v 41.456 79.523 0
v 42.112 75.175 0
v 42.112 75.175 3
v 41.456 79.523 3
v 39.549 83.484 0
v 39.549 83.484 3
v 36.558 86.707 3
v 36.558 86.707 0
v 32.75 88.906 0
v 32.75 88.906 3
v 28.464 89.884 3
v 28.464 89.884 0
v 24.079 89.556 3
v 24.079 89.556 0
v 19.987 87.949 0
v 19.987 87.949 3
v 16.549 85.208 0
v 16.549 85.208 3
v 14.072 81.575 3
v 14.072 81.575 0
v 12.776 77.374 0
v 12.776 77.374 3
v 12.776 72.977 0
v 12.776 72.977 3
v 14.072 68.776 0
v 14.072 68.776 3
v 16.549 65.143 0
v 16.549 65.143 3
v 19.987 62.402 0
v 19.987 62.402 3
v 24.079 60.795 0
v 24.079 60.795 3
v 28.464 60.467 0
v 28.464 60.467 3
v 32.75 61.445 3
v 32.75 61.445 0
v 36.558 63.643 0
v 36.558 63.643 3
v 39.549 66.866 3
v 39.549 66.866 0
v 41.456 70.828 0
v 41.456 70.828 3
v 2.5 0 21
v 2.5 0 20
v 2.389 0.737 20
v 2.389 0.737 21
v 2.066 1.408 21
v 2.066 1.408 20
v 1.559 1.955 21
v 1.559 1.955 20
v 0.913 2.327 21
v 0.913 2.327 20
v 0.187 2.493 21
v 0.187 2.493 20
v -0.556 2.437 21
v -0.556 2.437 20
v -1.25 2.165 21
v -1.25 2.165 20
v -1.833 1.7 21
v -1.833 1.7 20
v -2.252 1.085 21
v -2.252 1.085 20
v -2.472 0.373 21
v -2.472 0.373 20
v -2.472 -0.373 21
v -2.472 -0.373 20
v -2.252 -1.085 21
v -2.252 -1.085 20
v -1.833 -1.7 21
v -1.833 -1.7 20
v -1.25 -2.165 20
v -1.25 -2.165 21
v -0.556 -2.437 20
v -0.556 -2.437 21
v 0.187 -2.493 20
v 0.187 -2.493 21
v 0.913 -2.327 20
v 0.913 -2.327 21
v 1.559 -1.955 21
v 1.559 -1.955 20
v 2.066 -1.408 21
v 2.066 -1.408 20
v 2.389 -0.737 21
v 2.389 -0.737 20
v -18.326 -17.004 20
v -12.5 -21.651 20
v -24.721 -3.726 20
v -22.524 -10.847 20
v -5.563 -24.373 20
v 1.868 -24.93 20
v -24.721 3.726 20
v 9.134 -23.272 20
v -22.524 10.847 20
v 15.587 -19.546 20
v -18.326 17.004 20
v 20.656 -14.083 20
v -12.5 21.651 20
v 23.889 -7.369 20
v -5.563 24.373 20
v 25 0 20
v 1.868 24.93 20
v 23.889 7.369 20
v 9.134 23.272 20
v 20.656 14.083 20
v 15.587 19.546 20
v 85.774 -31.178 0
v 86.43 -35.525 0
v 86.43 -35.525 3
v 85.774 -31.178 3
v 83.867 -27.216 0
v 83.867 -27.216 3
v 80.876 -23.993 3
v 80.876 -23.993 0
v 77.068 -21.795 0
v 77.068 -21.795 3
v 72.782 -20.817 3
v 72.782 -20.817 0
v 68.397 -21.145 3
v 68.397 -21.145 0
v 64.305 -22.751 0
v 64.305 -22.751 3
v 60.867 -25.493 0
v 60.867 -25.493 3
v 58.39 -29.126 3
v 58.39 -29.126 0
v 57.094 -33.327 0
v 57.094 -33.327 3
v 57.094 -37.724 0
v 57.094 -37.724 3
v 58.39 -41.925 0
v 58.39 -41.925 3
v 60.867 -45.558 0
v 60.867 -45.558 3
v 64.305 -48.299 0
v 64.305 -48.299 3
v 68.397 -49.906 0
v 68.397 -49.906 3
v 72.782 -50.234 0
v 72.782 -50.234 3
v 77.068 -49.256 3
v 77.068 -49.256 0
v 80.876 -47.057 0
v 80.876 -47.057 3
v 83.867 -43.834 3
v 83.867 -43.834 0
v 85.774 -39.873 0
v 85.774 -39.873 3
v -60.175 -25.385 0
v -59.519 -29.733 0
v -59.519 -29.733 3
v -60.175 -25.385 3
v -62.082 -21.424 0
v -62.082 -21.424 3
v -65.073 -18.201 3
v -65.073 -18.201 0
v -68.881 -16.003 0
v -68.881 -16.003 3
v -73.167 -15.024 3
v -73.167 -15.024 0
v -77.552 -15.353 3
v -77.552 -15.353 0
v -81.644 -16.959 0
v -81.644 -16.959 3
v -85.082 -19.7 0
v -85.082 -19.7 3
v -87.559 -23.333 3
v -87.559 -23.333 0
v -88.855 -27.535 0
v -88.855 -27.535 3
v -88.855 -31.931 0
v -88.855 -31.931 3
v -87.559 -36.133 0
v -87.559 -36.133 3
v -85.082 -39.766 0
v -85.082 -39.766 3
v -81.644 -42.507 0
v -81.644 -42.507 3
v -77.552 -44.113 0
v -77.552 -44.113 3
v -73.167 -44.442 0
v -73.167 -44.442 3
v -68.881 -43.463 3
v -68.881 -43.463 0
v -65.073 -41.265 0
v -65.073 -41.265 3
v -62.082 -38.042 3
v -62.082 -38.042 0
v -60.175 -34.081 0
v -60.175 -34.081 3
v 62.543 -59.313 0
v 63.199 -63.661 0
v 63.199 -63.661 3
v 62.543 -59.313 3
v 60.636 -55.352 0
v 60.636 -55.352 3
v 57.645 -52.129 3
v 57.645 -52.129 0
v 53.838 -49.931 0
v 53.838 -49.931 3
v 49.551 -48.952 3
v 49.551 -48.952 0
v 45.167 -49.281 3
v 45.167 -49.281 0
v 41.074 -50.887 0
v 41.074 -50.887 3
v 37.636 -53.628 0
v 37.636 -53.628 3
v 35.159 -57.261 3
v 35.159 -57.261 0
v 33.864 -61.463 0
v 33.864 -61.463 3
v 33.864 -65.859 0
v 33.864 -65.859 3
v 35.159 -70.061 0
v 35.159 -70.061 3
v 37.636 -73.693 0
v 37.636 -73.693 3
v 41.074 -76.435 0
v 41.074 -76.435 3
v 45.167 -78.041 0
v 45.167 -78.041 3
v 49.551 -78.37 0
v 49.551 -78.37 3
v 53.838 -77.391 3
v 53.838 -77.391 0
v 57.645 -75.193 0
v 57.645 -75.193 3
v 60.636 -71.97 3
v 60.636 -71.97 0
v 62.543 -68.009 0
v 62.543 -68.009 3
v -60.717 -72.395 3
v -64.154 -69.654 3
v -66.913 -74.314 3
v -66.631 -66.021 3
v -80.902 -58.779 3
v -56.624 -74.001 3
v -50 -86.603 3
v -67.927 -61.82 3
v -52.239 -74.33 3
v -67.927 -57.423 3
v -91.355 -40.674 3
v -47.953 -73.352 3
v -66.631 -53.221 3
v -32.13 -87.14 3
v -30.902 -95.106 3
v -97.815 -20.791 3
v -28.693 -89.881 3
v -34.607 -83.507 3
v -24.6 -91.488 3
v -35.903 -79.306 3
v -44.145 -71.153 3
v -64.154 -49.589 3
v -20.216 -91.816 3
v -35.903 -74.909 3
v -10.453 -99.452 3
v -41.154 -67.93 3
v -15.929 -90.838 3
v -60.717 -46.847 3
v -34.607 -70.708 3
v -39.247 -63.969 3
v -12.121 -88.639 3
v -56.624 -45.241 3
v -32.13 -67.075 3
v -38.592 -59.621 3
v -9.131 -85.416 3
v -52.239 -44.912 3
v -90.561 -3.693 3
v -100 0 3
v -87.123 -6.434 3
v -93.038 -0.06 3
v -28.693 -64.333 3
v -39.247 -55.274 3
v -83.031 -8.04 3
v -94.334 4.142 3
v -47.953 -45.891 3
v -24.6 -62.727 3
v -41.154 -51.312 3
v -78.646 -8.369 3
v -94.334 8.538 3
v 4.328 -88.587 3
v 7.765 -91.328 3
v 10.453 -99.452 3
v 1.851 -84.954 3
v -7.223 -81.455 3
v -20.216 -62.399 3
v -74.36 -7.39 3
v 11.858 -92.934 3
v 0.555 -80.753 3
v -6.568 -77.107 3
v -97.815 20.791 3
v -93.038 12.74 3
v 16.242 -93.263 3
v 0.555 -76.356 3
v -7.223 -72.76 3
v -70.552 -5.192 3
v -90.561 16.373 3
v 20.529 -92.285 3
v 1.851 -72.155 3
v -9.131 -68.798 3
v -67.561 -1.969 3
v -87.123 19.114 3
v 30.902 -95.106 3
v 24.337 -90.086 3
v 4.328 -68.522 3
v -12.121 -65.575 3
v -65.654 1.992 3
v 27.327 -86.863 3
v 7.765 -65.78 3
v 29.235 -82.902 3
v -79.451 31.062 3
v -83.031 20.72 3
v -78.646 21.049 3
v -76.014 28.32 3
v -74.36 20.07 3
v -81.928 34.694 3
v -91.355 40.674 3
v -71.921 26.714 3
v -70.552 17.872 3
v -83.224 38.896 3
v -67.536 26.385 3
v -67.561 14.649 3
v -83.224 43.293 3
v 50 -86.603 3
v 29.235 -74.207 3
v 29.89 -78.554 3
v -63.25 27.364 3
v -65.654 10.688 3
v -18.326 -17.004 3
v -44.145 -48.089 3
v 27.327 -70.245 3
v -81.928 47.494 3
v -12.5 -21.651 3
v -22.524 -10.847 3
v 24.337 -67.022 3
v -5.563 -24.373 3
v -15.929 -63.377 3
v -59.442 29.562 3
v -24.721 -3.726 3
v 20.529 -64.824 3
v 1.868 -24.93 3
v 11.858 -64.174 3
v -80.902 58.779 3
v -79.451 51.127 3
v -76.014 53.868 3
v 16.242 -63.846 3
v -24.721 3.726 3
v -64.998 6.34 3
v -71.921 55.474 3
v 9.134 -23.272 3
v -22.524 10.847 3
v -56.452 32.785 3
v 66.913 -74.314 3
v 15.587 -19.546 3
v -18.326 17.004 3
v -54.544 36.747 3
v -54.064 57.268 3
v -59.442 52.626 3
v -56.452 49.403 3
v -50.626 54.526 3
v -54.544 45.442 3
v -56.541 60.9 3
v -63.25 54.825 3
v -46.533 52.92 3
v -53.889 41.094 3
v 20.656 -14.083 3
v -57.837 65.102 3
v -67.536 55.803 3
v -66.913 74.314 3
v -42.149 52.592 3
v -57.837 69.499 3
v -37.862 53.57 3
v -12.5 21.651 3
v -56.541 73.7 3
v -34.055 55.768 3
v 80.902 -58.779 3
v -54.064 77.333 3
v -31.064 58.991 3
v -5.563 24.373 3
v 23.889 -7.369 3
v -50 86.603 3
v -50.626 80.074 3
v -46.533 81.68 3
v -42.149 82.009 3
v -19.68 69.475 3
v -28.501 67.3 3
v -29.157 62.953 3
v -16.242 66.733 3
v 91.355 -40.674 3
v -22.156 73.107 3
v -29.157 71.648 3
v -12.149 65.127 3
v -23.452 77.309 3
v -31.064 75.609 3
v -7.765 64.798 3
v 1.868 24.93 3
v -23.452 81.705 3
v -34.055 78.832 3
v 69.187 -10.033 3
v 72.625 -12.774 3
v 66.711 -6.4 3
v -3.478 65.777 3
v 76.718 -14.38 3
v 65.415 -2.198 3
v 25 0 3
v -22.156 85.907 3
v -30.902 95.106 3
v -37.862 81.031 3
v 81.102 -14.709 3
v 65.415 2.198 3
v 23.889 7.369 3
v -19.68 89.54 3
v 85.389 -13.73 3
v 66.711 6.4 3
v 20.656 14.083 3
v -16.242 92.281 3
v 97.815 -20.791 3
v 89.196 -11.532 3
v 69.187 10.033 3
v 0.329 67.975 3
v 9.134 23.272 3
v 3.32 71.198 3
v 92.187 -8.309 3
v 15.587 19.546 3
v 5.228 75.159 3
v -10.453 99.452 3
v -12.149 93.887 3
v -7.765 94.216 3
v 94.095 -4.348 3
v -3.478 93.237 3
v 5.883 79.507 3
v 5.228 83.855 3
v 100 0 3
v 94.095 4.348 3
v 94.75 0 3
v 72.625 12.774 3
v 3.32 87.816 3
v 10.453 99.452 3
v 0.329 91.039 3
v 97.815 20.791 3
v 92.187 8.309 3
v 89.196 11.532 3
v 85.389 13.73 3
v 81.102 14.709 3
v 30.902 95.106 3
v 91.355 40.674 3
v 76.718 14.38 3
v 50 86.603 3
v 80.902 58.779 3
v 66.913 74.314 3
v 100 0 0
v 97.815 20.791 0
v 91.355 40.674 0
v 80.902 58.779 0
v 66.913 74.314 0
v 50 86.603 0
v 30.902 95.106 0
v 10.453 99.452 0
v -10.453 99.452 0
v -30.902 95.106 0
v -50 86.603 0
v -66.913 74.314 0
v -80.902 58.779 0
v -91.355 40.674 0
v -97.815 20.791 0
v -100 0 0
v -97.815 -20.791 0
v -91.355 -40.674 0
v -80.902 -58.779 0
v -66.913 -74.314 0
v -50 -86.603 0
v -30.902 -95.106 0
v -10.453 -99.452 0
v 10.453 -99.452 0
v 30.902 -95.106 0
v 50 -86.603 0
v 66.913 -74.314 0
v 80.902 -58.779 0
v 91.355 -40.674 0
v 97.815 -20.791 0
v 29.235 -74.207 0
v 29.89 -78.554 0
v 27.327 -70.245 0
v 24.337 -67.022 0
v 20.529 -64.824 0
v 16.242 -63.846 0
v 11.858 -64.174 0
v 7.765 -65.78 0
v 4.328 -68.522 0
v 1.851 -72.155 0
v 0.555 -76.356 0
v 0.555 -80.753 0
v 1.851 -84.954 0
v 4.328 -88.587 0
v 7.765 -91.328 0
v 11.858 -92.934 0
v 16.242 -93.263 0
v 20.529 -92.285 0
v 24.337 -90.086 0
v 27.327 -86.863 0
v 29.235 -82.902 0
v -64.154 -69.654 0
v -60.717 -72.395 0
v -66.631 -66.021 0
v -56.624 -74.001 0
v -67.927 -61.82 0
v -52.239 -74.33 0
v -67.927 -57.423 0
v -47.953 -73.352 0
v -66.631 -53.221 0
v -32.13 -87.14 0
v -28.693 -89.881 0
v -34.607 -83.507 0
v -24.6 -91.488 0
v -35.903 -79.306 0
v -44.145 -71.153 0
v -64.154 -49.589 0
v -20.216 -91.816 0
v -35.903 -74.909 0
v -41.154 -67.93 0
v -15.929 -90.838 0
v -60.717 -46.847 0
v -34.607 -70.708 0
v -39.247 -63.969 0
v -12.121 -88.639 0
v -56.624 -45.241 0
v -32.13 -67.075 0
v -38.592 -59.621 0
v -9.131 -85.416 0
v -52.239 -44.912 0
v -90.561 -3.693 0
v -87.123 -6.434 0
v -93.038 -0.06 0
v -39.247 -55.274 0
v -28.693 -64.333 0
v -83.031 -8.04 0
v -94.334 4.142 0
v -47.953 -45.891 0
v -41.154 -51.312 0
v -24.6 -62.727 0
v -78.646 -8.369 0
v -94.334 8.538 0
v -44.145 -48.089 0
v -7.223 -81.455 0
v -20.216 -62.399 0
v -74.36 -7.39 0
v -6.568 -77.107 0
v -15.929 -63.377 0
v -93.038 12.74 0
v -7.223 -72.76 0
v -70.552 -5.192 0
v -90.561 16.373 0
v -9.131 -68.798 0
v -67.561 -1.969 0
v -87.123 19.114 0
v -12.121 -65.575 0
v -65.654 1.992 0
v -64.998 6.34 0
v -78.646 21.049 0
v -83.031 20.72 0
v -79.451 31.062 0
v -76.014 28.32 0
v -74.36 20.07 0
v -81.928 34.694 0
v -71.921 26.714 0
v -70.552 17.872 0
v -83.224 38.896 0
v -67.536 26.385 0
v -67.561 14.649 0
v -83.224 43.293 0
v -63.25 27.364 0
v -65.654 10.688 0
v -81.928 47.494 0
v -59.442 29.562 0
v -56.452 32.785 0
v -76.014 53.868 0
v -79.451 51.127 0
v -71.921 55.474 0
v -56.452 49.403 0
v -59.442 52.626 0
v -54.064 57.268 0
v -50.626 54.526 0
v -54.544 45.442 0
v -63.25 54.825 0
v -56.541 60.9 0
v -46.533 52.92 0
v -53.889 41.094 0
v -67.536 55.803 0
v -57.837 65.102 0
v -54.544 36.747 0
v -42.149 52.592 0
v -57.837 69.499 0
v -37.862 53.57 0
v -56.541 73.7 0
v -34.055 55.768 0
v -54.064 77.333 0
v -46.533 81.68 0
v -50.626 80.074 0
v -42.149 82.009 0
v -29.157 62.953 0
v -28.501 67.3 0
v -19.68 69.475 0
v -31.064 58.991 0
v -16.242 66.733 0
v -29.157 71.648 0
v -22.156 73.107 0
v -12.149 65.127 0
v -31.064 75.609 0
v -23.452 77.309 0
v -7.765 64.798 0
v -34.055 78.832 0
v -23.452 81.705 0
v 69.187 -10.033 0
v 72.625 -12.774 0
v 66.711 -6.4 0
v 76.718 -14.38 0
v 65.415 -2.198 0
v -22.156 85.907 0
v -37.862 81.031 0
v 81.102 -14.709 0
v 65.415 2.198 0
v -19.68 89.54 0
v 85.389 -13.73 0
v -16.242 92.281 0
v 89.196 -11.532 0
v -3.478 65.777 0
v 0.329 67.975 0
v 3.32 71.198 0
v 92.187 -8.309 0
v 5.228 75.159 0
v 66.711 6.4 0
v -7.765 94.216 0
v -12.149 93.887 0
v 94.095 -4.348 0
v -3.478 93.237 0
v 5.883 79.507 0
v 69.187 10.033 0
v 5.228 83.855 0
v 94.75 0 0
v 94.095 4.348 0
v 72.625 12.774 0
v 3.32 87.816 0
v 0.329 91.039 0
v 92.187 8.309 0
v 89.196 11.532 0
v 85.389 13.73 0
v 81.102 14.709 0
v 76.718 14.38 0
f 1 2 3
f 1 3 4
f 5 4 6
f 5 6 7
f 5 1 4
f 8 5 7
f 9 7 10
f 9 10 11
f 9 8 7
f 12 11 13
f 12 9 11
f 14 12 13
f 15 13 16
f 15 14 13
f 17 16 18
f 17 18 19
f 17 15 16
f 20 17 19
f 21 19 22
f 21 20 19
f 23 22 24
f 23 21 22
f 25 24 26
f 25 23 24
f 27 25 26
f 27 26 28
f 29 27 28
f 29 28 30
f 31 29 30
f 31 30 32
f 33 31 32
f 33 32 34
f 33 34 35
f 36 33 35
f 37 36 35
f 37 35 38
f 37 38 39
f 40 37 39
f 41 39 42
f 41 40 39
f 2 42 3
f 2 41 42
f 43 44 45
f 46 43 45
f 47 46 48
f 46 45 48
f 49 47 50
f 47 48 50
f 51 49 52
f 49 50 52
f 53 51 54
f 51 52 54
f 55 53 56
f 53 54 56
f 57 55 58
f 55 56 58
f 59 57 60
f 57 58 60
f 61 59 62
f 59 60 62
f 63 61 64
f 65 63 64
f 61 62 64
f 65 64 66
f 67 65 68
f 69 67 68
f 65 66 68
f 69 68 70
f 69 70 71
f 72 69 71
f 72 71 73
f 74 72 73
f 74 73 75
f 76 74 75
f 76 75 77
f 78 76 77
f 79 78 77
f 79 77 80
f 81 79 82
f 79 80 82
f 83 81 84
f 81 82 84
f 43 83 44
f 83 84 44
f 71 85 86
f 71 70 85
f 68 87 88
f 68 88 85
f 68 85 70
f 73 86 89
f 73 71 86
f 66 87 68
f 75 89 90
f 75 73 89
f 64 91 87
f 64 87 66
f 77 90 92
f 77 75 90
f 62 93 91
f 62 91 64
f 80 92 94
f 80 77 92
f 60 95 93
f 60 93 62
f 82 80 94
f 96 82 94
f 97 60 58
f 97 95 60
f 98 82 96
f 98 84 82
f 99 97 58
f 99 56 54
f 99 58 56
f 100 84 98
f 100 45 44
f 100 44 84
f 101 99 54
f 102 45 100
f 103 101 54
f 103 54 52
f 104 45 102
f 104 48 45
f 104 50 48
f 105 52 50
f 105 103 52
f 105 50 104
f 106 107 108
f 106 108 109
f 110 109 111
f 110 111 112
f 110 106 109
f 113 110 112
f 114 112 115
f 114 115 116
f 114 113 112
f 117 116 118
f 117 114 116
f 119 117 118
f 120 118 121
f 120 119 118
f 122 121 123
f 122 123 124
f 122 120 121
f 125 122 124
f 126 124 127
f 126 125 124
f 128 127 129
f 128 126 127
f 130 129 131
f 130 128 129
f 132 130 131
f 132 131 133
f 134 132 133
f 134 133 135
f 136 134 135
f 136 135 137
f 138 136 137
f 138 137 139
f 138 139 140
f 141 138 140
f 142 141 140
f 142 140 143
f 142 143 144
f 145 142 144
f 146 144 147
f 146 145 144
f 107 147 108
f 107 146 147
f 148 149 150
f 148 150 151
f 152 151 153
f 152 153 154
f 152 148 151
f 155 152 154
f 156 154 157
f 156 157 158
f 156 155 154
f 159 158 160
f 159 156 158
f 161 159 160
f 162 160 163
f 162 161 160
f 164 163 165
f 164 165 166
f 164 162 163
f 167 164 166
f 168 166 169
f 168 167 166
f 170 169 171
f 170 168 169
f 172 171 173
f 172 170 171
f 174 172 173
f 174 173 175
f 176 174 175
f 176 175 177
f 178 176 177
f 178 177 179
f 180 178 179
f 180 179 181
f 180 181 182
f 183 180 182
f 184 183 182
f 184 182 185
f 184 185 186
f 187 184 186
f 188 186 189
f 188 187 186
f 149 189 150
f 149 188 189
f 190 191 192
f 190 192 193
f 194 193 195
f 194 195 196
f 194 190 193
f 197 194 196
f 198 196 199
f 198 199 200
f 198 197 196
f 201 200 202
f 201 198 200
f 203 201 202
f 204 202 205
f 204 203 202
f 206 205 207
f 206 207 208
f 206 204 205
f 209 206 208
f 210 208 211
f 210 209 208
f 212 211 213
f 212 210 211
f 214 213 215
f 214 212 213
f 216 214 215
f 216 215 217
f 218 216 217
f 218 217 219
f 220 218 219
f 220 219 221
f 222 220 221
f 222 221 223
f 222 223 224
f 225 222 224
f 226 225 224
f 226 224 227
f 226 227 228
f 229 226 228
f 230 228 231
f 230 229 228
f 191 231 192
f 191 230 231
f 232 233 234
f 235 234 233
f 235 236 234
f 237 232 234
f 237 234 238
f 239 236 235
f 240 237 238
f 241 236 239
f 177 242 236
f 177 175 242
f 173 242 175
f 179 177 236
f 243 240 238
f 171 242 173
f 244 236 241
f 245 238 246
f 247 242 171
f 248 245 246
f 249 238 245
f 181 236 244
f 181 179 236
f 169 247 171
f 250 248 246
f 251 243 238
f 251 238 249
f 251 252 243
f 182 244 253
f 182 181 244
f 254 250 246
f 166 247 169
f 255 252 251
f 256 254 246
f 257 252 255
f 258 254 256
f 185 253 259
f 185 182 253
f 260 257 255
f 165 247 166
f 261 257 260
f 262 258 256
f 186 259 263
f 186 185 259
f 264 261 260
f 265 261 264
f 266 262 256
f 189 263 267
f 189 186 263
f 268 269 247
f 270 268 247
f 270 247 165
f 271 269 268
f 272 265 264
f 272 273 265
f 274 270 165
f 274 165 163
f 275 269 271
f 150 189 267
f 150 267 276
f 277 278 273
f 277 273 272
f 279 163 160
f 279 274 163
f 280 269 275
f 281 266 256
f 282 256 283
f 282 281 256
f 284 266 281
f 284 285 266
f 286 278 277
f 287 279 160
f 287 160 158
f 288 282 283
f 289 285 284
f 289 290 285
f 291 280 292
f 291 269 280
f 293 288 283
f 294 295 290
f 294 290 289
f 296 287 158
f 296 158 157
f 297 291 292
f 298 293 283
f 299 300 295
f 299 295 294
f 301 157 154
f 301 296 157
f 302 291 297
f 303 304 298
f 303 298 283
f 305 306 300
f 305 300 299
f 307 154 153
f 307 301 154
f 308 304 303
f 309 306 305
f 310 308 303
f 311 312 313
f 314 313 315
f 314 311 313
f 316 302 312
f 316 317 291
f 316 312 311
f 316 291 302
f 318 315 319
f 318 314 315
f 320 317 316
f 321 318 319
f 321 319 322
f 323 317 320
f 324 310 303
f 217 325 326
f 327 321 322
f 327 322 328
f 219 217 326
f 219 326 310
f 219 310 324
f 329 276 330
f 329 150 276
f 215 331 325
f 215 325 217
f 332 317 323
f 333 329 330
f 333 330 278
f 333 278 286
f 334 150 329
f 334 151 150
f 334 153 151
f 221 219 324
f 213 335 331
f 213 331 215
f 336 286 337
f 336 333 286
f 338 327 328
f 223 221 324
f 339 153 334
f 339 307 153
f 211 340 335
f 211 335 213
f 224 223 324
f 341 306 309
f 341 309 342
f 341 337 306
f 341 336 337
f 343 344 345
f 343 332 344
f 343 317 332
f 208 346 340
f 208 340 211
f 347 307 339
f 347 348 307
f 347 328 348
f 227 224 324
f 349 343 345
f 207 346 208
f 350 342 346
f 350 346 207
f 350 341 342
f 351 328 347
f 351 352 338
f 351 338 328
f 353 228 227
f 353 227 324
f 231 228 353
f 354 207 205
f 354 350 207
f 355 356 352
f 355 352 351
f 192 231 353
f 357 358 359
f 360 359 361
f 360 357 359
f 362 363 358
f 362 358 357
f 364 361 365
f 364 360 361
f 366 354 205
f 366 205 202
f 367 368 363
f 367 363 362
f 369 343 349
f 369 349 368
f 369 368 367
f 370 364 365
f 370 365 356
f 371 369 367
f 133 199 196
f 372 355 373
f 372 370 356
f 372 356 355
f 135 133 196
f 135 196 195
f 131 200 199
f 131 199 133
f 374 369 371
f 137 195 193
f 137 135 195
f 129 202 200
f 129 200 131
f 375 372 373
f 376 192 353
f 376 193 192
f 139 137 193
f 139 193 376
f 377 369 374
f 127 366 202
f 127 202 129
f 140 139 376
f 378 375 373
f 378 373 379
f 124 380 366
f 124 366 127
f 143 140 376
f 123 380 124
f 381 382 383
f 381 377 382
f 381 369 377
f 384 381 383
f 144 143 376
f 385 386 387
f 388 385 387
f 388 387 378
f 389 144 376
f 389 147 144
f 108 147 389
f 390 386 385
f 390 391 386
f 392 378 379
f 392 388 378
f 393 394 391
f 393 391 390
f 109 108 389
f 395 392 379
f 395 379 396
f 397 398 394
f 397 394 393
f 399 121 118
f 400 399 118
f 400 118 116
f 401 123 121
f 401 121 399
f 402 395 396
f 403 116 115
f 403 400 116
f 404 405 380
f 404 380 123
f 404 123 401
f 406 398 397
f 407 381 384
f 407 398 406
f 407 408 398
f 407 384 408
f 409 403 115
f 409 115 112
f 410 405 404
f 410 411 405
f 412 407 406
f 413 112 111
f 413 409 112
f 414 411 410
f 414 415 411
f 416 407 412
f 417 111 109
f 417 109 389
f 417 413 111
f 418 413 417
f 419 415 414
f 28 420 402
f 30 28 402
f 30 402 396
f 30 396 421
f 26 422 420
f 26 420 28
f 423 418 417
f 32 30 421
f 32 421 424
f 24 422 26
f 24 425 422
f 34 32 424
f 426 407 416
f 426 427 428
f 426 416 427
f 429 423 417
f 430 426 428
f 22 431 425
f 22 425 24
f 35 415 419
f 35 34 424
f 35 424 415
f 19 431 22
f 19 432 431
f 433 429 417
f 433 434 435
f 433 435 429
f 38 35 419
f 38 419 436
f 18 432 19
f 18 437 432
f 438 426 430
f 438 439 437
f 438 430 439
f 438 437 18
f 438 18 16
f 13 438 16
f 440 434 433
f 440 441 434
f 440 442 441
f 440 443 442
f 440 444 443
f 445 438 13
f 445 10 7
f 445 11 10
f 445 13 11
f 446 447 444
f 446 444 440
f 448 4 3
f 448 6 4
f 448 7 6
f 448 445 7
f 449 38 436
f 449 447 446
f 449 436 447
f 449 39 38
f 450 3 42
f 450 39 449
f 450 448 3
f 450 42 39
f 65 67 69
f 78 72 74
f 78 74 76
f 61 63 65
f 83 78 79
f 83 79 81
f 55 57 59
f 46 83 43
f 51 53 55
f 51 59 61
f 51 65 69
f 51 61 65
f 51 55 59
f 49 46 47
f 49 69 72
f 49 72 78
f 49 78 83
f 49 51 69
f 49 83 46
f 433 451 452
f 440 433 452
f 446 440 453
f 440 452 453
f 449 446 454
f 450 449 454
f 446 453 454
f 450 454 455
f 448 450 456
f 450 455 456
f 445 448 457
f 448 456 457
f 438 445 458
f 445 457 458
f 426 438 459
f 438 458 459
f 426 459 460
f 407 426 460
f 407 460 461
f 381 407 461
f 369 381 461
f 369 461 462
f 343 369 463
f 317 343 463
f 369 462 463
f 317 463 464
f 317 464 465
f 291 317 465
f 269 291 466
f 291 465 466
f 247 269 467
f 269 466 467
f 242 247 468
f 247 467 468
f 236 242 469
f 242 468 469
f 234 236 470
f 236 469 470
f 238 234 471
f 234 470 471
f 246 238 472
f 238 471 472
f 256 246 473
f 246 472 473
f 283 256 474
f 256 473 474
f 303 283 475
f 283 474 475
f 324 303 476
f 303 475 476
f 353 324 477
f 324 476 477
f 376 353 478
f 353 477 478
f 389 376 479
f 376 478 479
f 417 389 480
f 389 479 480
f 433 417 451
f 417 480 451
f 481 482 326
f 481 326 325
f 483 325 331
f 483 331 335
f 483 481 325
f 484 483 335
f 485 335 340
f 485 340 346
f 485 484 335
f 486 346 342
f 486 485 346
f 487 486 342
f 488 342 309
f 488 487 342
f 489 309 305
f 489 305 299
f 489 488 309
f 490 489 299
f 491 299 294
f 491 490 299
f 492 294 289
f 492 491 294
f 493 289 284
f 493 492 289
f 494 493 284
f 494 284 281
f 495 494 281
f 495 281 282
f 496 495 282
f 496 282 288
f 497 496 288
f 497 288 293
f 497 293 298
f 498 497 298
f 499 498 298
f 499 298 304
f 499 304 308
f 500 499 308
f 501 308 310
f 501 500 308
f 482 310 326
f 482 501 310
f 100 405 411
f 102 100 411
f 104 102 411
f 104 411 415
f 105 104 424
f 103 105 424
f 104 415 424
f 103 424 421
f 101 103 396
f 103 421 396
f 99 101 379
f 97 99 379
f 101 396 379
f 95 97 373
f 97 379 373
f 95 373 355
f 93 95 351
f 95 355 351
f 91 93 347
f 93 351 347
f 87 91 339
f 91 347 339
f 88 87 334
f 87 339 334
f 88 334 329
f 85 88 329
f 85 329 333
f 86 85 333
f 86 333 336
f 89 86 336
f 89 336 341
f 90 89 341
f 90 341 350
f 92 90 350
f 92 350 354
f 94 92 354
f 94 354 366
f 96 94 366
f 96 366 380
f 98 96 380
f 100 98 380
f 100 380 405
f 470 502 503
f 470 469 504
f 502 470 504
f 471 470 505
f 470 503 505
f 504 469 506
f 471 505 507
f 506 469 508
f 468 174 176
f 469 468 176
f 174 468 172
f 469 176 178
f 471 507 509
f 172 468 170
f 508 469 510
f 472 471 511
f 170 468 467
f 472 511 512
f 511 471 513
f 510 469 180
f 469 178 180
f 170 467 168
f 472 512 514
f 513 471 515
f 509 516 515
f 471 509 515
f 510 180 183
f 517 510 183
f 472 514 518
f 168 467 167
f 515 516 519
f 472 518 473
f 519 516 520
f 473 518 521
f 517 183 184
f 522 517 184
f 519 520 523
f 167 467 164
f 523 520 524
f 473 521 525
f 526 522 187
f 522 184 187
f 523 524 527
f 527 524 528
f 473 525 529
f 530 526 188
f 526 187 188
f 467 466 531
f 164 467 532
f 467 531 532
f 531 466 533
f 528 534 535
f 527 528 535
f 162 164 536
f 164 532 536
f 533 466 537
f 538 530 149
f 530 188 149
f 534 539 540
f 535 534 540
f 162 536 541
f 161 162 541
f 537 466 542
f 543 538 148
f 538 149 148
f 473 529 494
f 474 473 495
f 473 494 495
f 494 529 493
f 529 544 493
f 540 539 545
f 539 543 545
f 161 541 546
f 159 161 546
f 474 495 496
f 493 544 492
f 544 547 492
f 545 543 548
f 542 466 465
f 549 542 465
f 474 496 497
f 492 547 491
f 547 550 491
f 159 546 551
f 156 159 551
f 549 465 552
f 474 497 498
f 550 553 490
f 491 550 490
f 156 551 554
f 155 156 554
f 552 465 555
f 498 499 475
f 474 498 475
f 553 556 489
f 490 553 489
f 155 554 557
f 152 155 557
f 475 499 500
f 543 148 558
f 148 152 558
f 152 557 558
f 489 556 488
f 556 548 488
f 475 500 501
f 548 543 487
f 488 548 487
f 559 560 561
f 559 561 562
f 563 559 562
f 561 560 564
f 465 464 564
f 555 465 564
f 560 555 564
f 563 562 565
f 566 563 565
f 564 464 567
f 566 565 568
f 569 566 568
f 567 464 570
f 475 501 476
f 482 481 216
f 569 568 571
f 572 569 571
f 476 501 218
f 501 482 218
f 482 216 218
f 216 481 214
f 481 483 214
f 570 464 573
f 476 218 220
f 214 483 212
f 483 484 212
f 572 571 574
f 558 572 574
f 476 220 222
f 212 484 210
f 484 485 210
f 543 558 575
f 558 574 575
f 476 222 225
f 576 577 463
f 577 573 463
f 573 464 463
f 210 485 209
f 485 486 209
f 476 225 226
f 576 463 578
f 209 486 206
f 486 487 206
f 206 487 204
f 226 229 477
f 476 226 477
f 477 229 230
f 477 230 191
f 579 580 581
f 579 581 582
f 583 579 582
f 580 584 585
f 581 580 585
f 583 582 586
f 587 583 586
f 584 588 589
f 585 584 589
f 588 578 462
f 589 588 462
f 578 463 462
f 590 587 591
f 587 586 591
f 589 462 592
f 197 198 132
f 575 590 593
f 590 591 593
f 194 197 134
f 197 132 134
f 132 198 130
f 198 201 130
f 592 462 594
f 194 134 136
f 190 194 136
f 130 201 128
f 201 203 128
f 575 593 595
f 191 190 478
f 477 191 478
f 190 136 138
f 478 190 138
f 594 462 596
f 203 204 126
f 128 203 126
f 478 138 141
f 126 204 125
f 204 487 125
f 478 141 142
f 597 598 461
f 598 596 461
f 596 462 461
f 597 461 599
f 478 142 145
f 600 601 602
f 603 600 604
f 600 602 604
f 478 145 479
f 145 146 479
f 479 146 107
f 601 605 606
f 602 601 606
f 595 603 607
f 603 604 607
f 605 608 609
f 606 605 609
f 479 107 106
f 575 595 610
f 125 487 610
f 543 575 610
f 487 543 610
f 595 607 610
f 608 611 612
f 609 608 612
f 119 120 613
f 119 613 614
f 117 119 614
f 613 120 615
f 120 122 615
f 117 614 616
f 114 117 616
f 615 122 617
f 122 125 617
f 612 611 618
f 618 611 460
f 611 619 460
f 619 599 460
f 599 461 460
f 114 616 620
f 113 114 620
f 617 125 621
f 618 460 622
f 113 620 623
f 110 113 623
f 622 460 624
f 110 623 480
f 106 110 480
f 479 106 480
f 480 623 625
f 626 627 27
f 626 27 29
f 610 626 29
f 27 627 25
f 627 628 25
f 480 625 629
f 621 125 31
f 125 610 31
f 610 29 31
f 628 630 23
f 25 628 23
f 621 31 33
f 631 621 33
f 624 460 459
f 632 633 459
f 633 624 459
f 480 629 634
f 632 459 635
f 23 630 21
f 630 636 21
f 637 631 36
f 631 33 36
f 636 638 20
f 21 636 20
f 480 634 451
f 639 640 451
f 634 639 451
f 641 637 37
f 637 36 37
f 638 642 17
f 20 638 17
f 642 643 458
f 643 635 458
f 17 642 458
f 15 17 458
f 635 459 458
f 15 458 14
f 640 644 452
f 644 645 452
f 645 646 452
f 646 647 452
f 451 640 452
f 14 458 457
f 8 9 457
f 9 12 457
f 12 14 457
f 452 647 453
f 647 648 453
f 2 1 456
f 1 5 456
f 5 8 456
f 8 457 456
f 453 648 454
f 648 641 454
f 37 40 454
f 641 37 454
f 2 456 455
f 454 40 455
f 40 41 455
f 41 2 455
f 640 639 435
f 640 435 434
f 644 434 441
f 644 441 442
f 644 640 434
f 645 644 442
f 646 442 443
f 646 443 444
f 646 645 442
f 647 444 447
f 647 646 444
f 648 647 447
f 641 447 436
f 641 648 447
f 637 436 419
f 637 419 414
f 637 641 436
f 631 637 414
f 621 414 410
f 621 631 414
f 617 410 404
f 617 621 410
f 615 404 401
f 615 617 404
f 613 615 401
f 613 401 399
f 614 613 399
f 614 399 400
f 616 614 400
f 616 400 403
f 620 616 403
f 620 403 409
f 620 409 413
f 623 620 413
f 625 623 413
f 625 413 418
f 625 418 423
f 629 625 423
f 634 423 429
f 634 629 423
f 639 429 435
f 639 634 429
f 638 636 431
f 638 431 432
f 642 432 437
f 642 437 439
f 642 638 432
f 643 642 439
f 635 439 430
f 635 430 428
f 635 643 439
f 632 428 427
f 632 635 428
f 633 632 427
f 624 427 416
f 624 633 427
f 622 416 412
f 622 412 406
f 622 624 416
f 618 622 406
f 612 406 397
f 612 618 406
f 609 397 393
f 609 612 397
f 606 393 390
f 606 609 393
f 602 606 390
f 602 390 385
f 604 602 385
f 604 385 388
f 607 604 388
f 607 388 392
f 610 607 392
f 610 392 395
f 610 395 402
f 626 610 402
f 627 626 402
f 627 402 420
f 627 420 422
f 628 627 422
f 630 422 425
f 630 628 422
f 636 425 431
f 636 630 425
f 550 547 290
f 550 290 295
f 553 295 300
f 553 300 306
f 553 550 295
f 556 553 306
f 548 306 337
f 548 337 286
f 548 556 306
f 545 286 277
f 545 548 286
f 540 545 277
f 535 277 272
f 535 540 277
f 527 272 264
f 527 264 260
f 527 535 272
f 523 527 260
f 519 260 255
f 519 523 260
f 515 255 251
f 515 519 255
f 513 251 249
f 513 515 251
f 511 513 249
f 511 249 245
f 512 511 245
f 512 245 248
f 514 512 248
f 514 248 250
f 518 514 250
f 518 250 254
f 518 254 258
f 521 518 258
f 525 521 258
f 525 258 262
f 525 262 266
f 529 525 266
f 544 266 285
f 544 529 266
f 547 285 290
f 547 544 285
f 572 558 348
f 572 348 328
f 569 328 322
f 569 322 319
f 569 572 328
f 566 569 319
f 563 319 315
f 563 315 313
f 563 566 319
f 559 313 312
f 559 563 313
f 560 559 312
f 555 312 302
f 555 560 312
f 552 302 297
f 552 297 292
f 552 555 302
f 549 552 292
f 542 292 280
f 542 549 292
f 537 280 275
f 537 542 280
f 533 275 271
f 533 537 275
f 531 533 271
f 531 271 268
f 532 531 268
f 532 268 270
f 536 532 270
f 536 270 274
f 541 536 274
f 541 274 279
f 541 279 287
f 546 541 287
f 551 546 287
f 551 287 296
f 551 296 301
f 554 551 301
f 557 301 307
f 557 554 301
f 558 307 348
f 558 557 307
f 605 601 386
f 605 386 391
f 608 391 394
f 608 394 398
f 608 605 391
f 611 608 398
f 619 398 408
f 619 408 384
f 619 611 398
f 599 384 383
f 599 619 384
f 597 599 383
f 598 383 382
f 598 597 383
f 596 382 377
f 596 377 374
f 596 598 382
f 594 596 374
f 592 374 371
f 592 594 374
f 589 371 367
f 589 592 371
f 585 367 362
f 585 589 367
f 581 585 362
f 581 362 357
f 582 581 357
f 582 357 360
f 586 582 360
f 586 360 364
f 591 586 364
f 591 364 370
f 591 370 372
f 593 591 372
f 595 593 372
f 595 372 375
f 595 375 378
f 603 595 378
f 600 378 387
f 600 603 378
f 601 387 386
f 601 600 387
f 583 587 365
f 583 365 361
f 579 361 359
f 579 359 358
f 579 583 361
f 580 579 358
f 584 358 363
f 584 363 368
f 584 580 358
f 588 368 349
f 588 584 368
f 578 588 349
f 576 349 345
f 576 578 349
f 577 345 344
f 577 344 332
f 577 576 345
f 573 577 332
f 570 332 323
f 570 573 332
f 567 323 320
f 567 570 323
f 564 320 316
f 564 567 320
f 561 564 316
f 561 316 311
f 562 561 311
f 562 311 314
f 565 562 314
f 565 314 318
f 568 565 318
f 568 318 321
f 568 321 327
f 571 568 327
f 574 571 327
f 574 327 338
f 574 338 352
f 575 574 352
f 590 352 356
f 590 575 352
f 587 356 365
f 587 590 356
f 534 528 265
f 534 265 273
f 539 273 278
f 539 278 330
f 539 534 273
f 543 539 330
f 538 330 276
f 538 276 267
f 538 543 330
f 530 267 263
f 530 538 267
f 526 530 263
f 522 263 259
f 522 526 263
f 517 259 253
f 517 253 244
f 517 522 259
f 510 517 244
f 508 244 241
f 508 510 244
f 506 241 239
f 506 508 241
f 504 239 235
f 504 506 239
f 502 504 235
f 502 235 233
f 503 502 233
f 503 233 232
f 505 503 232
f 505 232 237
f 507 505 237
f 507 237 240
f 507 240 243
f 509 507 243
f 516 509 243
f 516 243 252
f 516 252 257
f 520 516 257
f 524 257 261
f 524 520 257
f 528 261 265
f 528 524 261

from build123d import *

# Parameters (mm, degrees)
SKETCH1_R           = 100
SKETCH1_R_2         = 14.75
SKETCH1_R_3         = 25
BOSS_EXTRUDE1_DEPTH = 3
SKETCH1_3_R         = 25
BOSS_EXTRUDE2_DEPTH = 20
SKETCH2_R           = 2.5
BOSS_EXTRUDE3_DEPTH = 1


with BuildPart() as part:
    # Sketch1 → Boss-Extrude1 (new body)
    with BuildSketch(Plane.XY):
        Circle(SKETCH1_R)
        with Locations((80, 0)):
            Circle(SKETCH1_R_2, mode=Mode.SUBTRACT)
        with Locations((71.679501943, -35.525329008)):
            Circle(SKETCH1_R_2, mode=Mode.SUBTRACT)
        with Locations((48.448774971, -63.660947242)):
            Circle(SKETCH1_R_2, mode=Mode.SUBTRACT)
        with Locations((15.140099549, -78.554295781)):
            Circle(SKETCH1_R_2, mode=Mode.SUBTRACT)
        with Locations((-21.317905095, -77.107372685)):
            Circle(SKETCH1_R_2, mode=Mode.SUBTRACT)
        with Locations((-53.341520041, -59.621155974)):
            Circle(SKETCH1_R_2, mode=Mode.SUBTRACT)
        with Locations((-74.269434641, -29.732996453)):
            Circle(SKETCH1_R_2, mode=Mode.SUBTRACT)
        with Locations((-79.748382076, 6.339996549)):
            Circle(SKETCH1_R_2, mode=Mode.SUBTRACT)
        with Locations((-68.638673059, 41.094191326)):
            Circle(SKETCH1_R_2, mode=Mode.SUBTRACT)
        with Locations((-43.251265396, 67.300282626)):
            Circle(SKETCH1_R_2, mode=Mode.SUBTRACT)
        with Locations((-8.867055992, 79.507077157)):
            Circle(SKETCH1_R_2, mode=Mode.SUBTRACT)
        with Locations((27.361611466, 75.175409663)):
            Circle(SKETCH1_R_2, mode=Mode.SUBTRACT)
        Circle(SKETCH1_R_3, mode=Mode.SUBTRACT)
    extrude(amount=BOSS_EXTRUDE1_DEPTH)

    # Sketch1_3 → Boss-Extrude2 (add)
    with BuildSketch(Plane.XY):
        Circle(SKETCH1_3_R)
    extrude(amount=BOSS_EXTRUDE2_DEPTH)

    # Sketch2 → Boss-Extrude3 (add)
    with BuildSketch(Plane.XY.offset(20)):
        Circle(SKETCH2_R)
    extrude(amount=BOSS_EXTRUDE3_DEPTH)


solid = part.part
